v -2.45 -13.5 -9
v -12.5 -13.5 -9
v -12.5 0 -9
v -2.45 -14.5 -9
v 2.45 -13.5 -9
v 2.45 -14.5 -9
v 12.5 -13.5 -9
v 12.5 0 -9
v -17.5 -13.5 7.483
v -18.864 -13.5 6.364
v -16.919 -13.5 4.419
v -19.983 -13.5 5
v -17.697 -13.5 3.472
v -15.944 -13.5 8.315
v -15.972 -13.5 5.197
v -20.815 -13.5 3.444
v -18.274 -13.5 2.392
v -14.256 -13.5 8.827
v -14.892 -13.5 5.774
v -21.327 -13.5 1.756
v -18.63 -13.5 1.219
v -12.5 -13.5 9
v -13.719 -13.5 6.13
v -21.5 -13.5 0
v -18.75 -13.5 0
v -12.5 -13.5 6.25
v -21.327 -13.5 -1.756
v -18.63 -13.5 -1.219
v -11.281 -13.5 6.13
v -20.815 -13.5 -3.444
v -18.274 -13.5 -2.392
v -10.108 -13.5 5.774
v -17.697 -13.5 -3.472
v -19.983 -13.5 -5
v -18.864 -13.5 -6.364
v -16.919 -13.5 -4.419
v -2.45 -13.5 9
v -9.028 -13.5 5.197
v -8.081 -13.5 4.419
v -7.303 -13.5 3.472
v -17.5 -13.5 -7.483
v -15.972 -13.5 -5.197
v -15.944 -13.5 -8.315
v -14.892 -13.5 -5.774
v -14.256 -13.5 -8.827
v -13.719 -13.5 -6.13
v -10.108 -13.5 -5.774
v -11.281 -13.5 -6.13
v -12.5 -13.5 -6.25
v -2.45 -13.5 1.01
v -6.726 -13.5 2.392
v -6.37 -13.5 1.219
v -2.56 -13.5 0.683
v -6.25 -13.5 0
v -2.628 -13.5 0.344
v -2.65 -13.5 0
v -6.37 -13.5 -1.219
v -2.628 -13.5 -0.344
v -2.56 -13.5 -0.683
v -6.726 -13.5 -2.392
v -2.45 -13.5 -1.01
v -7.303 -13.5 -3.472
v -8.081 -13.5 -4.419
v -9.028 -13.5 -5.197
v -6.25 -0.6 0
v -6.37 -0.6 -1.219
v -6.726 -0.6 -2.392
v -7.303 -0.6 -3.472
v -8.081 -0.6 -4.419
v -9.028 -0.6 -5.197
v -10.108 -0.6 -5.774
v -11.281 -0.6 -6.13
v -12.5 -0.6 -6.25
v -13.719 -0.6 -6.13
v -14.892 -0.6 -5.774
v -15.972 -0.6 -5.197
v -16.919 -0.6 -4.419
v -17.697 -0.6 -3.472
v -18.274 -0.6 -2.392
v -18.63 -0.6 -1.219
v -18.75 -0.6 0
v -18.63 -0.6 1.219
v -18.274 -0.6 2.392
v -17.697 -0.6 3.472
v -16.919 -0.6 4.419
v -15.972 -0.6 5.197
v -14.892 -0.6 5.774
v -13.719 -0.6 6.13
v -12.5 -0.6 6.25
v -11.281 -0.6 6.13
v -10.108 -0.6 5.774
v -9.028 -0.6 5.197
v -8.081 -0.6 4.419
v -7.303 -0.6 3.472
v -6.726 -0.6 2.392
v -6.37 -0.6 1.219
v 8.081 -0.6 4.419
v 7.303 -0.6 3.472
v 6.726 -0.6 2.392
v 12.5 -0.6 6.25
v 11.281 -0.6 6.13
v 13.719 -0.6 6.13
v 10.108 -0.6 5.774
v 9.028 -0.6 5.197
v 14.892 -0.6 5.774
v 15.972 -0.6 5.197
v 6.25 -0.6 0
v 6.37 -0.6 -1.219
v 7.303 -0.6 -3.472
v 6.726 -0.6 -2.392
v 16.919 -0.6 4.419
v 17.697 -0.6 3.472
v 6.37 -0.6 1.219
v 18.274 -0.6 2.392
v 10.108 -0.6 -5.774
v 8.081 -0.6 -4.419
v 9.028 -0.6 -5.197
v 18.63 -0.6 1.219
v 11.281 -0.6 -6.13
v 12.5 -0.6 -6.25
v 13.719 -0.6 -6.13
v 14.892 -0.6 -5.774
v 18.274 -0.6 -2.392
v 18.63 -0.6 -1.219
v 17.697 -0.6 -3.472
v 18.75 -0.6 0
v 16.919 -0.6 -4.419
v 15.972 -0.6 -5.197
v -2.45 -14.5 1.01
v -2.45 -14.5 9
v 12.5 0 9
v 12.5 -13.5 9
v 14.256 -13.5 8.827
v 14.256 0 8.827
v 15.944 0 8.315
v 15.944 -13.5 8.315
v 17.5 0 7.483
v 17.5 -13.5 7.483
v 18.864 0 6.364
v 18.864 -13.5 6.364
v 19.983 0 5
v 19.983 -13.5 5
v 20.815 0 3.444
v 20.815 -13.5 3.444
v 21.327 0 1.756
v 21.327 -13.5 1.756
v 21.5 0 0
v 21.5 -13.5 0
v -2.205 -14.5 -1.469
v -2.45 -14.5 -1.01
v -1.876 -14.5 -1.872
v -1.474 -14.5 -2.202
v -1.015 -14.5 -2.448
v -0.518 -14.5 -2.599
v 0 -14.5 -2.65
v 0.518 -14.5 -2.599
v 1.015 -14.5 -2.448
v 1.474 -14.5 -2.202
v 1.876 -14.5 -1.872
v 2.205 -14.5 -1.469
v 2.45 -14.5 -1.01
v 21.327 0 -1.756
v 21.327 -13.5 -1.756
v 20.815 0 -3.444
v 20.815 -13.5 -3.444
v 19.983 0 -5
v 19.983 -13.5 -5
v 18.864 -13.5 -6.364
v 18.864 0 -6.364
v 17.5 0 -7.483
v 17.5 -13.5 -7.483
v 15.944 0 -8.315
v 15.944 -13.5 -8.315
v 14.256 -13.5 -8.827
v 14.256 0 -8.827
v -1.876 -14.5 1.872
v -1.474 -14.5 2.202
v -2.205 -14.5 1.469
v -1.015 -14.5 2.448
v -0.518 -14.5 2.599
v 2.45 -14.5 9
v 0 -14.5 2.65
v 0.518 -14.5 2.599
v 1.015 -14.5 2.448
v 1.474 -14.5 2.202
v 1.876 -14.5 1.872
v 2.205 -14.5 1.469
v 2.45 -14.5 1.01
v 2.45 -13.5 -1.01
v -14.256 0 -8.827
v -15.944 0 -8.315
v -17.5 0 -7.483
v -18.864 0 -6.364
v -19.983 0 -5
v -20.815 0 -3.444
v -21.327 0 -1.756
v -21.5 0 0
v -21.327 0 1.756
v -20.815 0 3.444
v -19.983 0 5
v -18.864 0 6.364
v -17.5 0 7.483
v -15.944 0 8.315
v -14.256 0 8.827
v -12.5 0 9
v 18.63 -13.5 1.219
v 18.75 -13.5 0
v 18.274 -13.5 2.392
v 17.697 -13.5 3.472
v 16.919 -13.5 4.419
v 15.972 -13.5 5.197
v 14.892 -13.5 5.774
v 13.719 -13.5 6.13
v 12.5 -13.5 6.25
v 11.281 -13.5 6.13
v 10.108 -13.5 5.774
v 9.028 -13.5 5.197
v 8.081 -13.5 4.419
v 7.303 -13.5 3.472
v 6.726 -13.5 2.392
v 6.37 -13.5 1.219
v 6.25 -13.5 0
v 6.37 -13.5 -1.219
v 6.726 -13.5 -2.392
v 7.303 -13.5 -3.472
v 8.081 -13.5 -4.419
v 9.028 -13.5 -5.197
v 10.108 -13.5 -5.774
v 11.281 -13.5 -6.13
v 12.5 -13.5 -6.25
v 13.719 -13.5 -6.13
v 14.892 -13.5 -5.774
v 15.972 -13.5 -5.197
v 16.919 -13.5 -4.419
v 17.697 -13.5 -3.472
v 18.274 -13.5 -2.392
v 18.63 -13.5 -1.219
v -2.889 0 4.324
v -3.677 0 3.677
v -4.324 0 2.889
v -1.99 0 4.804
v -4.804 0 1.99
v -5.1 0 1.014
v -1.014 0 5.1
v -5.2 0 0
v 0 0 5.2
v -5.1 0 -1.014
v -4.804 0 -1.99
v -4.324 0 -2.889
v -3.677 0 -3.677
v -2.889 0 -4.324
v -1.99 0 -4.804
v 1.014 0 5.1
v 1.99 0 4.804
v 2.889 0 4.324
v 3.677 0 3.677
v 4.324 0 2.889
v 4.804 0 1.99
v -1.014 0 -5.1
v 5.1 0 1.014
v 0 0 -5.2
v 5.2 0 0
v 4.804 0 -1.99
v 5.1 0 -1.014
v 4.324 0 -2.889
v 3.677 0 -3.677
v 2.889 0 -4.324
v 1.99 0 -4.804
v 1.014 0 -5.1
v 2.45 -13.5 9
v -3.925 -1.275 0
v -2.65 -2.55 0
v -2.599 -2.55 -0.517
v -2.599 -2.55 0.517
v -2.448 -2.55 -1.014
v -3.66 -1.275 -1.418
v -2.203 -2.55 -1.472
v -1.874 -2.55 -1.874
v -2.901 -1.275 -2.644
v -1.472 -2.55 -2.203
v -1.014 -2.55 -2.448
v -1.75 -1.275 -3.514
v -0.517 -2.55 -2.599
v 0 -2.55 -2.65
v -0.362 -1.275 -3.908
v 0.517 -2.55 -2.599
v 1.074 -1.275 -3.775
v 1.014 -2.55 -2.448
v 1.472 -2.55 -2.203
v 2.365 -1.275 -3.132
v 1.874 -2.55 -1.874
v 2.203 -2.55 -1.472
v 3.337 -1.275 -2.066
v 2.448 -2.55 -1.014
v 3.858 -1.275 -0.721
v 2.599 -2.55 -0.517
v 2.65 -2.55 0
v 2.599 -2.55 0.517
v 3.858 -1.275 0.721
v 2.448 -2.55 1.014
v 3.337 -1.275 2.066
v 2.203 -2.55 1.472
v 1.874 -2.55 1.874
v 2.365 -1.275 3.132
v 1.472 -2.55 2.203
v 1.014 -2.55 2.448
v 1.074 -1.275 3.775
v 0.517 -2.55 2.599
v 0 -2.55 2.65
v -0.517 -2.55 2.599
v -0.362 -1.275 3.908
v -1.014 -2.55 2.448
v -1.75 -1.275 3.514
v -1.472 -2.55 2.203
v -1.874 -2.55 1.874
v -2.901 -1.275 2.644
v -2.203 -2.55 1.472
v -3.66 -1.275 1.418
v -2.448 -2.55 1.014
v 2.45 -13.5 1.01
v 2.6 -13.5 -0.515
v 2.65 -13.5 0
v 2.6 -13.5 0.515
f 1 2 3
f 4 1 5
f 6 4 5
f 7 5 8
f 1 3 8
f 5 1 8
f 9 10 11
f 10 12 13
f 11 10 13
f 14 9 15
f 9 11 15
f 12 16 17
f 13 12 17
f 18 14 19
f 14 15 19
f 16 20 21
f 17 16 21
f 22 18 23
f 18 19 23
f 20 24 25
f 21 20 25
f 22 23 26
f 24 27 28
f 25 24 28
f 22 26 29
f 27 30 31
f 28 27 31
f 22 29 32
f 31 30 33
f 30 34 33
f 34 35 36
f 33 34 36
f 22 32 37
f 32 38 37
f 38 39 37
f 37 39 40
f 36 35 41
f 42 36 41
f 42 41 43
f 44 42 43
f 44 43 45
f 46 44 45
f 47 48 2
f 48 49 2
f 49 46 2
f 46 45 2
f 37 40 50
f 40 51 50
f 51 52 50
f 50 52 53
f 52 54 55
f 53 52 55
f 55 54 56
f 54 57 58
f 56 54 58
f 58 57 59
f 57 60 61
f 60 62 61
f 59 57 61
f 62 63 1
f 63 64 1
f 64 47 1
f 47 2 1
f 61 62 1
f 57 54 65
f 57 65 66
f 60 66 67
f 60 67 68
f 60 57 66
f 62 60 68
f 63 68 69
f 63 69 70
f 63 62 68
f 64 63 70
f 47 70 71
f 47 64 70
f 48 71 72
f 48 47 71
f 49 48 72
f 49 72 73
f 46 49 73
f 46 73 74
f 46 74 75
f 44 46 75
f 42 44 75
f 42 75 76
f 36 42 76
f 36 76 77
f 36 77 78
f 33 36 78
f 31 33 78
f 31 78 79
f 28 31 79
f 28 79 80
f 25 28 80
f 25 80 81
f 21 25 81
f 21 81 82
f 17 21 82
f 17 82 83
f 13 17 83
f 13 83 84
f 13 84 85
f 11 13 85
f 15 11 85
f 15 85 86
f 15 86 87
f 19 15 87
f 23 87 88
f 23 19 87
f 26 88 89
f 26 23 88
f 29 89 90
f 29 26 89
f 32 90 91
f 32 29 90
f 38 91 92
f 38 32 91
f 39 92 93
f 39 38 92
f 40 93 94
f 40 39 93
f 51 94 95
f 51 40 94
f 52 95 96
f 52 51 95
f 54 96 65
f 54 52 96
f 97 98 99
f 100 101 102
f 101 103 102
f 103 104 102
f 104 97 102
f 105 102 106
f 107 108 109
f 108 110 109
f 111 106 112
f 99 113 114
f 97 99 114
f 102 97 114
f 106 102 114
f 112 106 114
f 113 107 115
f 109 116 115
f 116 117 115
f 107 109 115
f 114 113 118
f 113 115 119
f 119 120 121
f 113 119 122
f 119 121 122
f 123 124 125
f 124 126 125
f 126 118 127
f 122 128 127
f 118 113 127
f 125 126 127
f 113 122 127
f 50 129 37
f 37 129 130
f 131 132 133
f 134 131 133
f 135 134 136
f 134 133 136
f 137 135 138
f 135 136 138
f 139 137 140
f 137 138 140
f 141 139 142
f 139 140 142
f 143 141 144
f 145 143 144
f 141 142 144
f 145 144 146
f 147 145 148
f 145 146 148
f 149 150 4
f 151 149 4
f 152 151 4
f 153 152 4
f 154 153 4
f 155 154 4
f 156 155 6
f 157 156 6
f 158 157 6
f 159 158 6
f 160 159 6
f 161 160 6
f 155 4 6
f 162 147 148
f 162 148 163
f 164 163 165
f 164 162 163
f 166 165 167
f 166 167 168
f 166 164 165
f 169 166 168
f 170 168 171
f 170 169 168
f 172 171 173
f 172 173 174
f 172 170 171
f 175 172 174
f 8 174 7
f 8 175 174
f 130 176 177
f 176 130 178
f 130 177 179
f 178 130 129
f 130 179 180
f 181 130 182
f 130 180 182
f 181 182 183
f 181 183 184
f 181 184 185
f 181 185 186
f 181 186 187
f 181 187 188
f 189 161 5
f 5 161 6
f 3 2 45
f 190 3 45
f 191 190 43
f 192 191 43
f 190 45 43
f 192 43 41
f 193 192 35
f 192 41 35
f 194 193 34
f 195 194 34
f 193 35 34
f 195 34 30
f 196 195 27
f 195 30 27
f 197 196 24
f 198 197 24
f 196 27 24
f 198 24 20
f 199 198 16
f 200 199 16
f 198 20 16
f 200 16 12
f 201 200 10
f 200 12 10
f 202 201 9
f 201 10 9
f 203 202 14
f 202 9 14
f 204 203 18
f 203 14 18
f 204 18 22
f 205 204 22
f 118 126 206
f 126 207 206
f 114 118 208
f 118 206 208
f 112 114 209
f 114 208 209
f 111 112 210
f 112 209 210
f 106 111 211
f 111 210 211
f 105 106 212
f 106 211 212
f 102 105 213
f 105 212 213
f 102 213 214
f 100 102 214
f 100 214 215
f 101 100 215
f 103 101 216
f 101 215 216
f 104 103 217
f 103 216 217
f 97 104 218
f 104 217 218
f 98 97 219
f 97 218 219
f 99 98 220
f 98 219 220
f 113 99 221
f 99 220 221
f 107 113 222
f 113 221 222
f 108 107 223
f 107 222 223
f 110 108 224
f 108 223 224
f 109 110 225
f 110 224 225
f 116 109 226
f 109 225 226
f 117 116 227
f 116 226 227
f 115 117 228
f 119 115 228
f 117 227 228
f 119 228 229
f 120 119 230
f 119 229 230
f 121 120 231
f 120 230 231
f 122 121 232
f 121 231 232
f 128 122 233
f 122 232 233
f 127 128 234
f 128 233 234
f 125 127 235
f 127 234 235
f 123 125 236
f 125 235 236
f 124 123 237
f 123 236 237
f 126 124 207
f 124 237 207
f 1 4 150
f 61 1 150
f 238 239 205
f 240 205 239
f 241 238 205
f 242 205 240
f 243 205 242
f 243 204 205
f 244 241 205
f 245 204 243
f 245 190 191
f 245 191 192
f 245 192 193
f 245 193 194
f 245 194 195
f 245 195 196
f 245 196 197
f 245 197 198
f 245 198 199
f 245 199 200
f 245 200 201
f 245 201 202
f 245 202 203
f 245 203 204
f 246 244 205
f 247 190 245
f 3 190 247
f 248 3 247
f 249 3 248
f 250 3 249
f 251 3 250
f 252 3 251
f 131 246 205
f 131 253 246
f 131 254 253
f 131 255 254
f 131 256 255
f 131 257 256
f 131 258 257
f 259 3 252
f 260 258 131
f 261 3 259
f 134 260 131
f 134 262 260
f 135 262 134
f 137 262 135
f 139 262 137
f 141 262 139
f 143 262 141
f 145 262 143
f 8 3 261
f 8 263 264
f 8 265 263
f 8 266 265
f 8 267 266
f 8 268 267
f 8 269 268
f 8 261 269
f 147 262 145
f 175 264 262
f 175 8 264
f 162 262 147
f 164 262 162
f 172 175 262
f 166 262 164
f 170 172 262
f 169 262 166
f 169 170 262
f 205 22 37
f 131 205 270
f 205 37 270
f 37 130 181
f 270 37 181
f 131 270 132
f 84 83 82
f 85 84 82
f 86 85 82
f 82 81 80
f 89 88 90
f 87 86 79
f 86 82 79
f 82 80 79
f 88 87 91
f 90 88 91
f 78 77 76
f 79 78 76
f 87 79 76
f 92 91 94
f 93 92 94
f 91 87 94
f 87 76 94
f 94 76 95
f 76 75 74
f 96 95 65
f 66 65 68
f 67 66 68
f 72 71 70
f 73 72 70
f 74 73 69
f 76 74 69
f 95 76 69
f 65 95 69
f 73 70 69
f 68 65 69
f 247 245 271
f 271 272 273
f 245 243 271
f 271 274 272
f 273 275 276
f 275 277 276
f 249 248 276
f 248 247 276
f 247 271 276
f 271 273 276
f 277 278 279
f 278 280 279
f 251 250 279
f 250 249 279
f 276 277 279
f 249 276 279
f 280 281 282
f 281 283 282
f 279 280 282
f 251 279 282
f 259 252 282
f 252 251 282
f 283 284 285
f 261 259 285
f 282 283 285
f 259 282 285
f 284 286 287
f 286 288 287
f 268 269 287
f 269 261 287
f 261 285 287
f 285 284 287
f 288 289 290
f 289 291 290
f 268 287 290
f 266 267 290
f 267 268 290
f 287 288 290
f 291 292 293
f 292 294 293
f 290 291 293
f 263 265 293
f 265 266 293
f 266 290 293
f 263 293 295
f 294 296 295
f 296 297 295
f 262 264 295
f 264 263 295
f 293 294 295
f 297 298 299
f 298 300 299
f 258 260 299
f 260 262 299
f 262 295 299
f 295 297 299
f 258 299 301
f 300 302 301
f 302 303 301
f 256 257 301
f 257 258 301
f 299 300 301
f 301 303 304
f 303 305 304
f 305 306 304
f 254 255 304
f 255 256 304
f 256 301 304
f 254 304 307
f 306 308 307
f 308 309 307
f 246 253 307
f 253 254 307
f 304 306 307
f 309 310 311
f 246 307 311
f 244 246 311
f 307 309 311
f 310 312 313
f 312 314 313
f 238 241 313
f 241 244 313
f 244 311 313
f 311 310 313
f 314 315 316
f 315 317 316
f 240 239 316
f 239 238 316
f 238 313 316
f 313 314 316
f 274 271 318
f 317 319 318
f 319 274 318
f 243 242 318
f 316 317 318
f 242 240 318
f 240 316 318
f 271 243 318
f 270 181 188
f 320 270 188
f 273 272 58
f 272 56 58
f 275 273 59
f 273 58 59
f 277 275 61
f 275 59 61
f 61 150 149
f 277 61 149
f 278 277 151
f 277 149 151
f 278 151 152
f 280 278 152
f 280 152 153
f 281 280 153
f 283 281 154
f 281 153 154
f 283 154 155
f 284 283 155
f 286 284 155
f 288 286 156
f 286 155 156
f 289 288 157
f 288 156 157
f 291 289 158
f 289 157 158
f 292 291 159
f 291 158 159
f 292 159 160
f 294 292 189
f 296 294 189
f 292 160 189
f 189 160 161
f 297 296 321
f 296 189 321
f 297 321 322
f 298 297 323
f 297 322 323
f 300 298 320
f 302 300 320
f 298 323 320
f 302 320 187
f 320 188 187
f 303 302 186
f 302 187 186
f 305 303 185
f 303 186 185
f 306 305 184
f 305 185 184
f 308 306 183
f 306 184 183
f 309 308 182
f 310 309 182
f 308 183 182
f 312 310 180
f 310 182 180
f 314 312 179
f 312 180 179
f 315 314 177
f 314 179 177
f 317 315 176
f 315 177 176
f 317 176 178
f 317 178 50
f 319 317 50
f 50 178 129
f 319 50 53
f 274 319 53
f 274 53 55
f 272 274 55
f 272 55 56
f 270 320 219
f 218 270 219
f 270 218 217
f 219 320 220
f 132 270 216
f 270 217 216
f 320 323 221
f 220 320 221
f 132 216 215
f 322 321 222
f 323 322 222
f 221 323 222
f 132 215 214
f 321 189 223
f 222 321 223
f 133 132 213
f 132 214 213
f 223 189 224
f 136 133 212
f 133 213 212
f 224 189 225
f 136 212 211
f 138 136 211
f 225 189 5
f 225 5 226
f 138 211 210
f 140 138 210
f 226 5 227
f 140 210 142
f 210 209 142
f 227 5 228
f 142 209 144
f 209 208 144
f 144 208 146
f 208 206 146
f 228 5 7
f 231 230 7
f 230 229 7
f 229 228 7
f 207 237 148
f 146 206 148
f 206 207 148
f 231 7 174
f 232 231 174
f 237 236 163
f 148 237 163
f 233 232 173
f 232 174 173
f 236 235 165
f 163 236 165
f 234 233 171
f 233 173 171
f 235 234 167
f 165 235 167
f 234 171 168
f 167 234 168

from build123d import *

# Parameters (mm, degrees)
SKETCH1_W                                       = 2.45
SKETCH1_H                                       = 9
BOSS_EXTRUDE1_DEPTH                             = 13.5
BOSS_EXTRUDE2_DEPTH                             = 0.6
BOSS_EXTRUDE3_START                             = -13.5
SKETCH1_4_W                                     = 2.45
SKETCH1_4_H                                     = 9
BOSS_EXTRUDE3_DEPTH                             = 1
MIRROR1_START                                   = -13.5
MIRROR1_OUTLINE_R                               = 6.25
MIRROR1_DEPTH                                   = 13.5
MIRROR1_START_2                                 = -0.6
MIRROR1_2_OUTLINE_R                             = 6.25
MIRROR1_2_DEPTH                                 = 0.6
MIRROR1_START_3                                 = -14.5
MIRROR1_3_DEPTH                                 = 1
CSK_FOR_M5_FLAT_HEAD_MACHINE_SCREW1_D           = 5.3
CSK_FOR_M5_FLAT_HEAD_MACHINE_SCREW1_CSINK_D     = 10.4
CSK_FOR_M5_FLAT_HEAD_MACHINE_SCREW1_CSINK_ANGLE = 90


# Read off the part's stored shape, not the designer's step: Mirror1
with BuildPart() as part:
    # Sketch1 → Boss-Extrude1 (new body)
    with BuildSketch(Plane(origin=(0, 0, 0), x_dir=(1, 0, 0), z_dir=(0, 1, 0))):
        with Locations((1.225, 4.5)):
            Rectangle(SKETCH1_W, SKETCH1_H)
        with BuildLine():
            Line((2.45, 9), (2.45, 0))
            Line((2.45, 0), (6.25, 0))
            ThreePointArc((6.25, 0), (12.5, 6.25), (18.75, 0))
            Line((18.75, 0), (21.5, 0))
            ThreePointArc((21.5, 0), (18.863961031, 6.363961031), (12.5, 9))
            Line((12.5, 9), (2.45, 9))
        make_face()
    extrude(amount=-BOSS_EXTRUDE1_DEPTH)

    # Sketch1<3> → Boss-Extrude2 (add)
    with BuildSketch(Plane(origin=(0, 0, 0), x_dir=(1, 0, 0), z_dir=(0, 1, 0))):
        with BuildLine():
            ThreePointArc((18.75, 0), (12.5, 6.25), (6.25, 0))
            Line((6.25, 0), (18.75, 0))
        make_face()
    extrude(amount=-BOSS_EXTRUDE2_DEPTH)

    # Sketch1<4> → Boss-Extrude3 (add)
    with BuildSketch(Plane(origin=(0, 0, 0), x_dir=(1, 0, 0), z_dir=(0, 1, 0)).offset(BOSS_EXTRUDE3_START)):
        with Locations((1.225, 4.5)):
            Rectangle(SKETCH1_4_W, SKETCH1_4_H)
    extrude(amount=-BOSS_EXTRUDE3_DEPTH)

    # Mirror1 outline → Mirror1 (add)
    with BuildSketch(Plane(origin=(0, 0, 0), x_dir=(1, 0, 0), z_dir=(0, 1, 0)).offset(MIRROR1_START)):
        with BuildLine():
            Line((21.5, 0), (18.75, 0))
            ThreePointArc((18.75, 0), (12.5, -6.25), (6.25, 0))
            Line((6.25, 0), (0, 0))
            Line((0, 0), (0, 9))
            Line((0, 9), (-12.5, 9))
            ThreePointArc((-12.5, 9), (-21.5, 0), (-12.5, -9))
            Line((-12.5, -9), (12.5, -9))
            ThreePointArc((12.5, -9), (18.863961031, -6.363961031), (21.5, 0))
        make_face()
        with Locations((-12.5, 0)):
            Circle(MIRROR1_OUTLINE_R, mode=Mode.SUBTRACT)
    extrude(amount=MIRROR1_DEPTH)

    # Mirror1 2 outline → Mirror1 2 (add)
    with BuildSketch(Plane(origin=(0, 0, 0), x_dir=(1, 0, 0), z_dir=(0, 1, 0)).offset(MIRROR1_START_2)):
        with BuildLine():
            ThreePointArc((6.25, 0), (12.5, -6.25), (18.75, 0))
            Line((18.75, 0), (6.25, 0))
        make_face()
        with Locations((-12.5, 0)):
            Circle(MIRROR1_2_OUTLINE_R)
    extrude(amount=MIRROR1_2_DEPTH)

    # Mirror1 3 outline → Mirror1 3 (add)
    with BuildSketch(Plane(origin=(0, 0, 0), x_dir=(1, 0, 0), z_dir=(0, 1, 0)).offset(MIRROR1_START_3)):
        Polygon((2.45, -9), (2.45, 0), (0, 0), (0, 9), (-2.45, 9), (-2.45, -9), align=None)
    extrude(amount=MIRROR1_3_DEPTH)

    # CSK for M5 Flat Head Machine Screw1 (through all)
    with Locations(Plane(origin=(0, 0, 0), x_dir=(1, 0, 0), z_dir=(0, 1, 0))):
        with Locations((0, 0)):
            CounterSinkHole(CSK_FOR_M5_FLAT_HEAD_MACHINE_SCREW1_D / 2, CSK_FOR_M5_FLAT_HEAD_MACHINE_SCREW1_CSINK_D / 2, counter_sink_angle=CSK_FOR_M5_FLAT_HEAD_MACHINE_SCREW1_CSINK_ANGLE)


solid = part.part
